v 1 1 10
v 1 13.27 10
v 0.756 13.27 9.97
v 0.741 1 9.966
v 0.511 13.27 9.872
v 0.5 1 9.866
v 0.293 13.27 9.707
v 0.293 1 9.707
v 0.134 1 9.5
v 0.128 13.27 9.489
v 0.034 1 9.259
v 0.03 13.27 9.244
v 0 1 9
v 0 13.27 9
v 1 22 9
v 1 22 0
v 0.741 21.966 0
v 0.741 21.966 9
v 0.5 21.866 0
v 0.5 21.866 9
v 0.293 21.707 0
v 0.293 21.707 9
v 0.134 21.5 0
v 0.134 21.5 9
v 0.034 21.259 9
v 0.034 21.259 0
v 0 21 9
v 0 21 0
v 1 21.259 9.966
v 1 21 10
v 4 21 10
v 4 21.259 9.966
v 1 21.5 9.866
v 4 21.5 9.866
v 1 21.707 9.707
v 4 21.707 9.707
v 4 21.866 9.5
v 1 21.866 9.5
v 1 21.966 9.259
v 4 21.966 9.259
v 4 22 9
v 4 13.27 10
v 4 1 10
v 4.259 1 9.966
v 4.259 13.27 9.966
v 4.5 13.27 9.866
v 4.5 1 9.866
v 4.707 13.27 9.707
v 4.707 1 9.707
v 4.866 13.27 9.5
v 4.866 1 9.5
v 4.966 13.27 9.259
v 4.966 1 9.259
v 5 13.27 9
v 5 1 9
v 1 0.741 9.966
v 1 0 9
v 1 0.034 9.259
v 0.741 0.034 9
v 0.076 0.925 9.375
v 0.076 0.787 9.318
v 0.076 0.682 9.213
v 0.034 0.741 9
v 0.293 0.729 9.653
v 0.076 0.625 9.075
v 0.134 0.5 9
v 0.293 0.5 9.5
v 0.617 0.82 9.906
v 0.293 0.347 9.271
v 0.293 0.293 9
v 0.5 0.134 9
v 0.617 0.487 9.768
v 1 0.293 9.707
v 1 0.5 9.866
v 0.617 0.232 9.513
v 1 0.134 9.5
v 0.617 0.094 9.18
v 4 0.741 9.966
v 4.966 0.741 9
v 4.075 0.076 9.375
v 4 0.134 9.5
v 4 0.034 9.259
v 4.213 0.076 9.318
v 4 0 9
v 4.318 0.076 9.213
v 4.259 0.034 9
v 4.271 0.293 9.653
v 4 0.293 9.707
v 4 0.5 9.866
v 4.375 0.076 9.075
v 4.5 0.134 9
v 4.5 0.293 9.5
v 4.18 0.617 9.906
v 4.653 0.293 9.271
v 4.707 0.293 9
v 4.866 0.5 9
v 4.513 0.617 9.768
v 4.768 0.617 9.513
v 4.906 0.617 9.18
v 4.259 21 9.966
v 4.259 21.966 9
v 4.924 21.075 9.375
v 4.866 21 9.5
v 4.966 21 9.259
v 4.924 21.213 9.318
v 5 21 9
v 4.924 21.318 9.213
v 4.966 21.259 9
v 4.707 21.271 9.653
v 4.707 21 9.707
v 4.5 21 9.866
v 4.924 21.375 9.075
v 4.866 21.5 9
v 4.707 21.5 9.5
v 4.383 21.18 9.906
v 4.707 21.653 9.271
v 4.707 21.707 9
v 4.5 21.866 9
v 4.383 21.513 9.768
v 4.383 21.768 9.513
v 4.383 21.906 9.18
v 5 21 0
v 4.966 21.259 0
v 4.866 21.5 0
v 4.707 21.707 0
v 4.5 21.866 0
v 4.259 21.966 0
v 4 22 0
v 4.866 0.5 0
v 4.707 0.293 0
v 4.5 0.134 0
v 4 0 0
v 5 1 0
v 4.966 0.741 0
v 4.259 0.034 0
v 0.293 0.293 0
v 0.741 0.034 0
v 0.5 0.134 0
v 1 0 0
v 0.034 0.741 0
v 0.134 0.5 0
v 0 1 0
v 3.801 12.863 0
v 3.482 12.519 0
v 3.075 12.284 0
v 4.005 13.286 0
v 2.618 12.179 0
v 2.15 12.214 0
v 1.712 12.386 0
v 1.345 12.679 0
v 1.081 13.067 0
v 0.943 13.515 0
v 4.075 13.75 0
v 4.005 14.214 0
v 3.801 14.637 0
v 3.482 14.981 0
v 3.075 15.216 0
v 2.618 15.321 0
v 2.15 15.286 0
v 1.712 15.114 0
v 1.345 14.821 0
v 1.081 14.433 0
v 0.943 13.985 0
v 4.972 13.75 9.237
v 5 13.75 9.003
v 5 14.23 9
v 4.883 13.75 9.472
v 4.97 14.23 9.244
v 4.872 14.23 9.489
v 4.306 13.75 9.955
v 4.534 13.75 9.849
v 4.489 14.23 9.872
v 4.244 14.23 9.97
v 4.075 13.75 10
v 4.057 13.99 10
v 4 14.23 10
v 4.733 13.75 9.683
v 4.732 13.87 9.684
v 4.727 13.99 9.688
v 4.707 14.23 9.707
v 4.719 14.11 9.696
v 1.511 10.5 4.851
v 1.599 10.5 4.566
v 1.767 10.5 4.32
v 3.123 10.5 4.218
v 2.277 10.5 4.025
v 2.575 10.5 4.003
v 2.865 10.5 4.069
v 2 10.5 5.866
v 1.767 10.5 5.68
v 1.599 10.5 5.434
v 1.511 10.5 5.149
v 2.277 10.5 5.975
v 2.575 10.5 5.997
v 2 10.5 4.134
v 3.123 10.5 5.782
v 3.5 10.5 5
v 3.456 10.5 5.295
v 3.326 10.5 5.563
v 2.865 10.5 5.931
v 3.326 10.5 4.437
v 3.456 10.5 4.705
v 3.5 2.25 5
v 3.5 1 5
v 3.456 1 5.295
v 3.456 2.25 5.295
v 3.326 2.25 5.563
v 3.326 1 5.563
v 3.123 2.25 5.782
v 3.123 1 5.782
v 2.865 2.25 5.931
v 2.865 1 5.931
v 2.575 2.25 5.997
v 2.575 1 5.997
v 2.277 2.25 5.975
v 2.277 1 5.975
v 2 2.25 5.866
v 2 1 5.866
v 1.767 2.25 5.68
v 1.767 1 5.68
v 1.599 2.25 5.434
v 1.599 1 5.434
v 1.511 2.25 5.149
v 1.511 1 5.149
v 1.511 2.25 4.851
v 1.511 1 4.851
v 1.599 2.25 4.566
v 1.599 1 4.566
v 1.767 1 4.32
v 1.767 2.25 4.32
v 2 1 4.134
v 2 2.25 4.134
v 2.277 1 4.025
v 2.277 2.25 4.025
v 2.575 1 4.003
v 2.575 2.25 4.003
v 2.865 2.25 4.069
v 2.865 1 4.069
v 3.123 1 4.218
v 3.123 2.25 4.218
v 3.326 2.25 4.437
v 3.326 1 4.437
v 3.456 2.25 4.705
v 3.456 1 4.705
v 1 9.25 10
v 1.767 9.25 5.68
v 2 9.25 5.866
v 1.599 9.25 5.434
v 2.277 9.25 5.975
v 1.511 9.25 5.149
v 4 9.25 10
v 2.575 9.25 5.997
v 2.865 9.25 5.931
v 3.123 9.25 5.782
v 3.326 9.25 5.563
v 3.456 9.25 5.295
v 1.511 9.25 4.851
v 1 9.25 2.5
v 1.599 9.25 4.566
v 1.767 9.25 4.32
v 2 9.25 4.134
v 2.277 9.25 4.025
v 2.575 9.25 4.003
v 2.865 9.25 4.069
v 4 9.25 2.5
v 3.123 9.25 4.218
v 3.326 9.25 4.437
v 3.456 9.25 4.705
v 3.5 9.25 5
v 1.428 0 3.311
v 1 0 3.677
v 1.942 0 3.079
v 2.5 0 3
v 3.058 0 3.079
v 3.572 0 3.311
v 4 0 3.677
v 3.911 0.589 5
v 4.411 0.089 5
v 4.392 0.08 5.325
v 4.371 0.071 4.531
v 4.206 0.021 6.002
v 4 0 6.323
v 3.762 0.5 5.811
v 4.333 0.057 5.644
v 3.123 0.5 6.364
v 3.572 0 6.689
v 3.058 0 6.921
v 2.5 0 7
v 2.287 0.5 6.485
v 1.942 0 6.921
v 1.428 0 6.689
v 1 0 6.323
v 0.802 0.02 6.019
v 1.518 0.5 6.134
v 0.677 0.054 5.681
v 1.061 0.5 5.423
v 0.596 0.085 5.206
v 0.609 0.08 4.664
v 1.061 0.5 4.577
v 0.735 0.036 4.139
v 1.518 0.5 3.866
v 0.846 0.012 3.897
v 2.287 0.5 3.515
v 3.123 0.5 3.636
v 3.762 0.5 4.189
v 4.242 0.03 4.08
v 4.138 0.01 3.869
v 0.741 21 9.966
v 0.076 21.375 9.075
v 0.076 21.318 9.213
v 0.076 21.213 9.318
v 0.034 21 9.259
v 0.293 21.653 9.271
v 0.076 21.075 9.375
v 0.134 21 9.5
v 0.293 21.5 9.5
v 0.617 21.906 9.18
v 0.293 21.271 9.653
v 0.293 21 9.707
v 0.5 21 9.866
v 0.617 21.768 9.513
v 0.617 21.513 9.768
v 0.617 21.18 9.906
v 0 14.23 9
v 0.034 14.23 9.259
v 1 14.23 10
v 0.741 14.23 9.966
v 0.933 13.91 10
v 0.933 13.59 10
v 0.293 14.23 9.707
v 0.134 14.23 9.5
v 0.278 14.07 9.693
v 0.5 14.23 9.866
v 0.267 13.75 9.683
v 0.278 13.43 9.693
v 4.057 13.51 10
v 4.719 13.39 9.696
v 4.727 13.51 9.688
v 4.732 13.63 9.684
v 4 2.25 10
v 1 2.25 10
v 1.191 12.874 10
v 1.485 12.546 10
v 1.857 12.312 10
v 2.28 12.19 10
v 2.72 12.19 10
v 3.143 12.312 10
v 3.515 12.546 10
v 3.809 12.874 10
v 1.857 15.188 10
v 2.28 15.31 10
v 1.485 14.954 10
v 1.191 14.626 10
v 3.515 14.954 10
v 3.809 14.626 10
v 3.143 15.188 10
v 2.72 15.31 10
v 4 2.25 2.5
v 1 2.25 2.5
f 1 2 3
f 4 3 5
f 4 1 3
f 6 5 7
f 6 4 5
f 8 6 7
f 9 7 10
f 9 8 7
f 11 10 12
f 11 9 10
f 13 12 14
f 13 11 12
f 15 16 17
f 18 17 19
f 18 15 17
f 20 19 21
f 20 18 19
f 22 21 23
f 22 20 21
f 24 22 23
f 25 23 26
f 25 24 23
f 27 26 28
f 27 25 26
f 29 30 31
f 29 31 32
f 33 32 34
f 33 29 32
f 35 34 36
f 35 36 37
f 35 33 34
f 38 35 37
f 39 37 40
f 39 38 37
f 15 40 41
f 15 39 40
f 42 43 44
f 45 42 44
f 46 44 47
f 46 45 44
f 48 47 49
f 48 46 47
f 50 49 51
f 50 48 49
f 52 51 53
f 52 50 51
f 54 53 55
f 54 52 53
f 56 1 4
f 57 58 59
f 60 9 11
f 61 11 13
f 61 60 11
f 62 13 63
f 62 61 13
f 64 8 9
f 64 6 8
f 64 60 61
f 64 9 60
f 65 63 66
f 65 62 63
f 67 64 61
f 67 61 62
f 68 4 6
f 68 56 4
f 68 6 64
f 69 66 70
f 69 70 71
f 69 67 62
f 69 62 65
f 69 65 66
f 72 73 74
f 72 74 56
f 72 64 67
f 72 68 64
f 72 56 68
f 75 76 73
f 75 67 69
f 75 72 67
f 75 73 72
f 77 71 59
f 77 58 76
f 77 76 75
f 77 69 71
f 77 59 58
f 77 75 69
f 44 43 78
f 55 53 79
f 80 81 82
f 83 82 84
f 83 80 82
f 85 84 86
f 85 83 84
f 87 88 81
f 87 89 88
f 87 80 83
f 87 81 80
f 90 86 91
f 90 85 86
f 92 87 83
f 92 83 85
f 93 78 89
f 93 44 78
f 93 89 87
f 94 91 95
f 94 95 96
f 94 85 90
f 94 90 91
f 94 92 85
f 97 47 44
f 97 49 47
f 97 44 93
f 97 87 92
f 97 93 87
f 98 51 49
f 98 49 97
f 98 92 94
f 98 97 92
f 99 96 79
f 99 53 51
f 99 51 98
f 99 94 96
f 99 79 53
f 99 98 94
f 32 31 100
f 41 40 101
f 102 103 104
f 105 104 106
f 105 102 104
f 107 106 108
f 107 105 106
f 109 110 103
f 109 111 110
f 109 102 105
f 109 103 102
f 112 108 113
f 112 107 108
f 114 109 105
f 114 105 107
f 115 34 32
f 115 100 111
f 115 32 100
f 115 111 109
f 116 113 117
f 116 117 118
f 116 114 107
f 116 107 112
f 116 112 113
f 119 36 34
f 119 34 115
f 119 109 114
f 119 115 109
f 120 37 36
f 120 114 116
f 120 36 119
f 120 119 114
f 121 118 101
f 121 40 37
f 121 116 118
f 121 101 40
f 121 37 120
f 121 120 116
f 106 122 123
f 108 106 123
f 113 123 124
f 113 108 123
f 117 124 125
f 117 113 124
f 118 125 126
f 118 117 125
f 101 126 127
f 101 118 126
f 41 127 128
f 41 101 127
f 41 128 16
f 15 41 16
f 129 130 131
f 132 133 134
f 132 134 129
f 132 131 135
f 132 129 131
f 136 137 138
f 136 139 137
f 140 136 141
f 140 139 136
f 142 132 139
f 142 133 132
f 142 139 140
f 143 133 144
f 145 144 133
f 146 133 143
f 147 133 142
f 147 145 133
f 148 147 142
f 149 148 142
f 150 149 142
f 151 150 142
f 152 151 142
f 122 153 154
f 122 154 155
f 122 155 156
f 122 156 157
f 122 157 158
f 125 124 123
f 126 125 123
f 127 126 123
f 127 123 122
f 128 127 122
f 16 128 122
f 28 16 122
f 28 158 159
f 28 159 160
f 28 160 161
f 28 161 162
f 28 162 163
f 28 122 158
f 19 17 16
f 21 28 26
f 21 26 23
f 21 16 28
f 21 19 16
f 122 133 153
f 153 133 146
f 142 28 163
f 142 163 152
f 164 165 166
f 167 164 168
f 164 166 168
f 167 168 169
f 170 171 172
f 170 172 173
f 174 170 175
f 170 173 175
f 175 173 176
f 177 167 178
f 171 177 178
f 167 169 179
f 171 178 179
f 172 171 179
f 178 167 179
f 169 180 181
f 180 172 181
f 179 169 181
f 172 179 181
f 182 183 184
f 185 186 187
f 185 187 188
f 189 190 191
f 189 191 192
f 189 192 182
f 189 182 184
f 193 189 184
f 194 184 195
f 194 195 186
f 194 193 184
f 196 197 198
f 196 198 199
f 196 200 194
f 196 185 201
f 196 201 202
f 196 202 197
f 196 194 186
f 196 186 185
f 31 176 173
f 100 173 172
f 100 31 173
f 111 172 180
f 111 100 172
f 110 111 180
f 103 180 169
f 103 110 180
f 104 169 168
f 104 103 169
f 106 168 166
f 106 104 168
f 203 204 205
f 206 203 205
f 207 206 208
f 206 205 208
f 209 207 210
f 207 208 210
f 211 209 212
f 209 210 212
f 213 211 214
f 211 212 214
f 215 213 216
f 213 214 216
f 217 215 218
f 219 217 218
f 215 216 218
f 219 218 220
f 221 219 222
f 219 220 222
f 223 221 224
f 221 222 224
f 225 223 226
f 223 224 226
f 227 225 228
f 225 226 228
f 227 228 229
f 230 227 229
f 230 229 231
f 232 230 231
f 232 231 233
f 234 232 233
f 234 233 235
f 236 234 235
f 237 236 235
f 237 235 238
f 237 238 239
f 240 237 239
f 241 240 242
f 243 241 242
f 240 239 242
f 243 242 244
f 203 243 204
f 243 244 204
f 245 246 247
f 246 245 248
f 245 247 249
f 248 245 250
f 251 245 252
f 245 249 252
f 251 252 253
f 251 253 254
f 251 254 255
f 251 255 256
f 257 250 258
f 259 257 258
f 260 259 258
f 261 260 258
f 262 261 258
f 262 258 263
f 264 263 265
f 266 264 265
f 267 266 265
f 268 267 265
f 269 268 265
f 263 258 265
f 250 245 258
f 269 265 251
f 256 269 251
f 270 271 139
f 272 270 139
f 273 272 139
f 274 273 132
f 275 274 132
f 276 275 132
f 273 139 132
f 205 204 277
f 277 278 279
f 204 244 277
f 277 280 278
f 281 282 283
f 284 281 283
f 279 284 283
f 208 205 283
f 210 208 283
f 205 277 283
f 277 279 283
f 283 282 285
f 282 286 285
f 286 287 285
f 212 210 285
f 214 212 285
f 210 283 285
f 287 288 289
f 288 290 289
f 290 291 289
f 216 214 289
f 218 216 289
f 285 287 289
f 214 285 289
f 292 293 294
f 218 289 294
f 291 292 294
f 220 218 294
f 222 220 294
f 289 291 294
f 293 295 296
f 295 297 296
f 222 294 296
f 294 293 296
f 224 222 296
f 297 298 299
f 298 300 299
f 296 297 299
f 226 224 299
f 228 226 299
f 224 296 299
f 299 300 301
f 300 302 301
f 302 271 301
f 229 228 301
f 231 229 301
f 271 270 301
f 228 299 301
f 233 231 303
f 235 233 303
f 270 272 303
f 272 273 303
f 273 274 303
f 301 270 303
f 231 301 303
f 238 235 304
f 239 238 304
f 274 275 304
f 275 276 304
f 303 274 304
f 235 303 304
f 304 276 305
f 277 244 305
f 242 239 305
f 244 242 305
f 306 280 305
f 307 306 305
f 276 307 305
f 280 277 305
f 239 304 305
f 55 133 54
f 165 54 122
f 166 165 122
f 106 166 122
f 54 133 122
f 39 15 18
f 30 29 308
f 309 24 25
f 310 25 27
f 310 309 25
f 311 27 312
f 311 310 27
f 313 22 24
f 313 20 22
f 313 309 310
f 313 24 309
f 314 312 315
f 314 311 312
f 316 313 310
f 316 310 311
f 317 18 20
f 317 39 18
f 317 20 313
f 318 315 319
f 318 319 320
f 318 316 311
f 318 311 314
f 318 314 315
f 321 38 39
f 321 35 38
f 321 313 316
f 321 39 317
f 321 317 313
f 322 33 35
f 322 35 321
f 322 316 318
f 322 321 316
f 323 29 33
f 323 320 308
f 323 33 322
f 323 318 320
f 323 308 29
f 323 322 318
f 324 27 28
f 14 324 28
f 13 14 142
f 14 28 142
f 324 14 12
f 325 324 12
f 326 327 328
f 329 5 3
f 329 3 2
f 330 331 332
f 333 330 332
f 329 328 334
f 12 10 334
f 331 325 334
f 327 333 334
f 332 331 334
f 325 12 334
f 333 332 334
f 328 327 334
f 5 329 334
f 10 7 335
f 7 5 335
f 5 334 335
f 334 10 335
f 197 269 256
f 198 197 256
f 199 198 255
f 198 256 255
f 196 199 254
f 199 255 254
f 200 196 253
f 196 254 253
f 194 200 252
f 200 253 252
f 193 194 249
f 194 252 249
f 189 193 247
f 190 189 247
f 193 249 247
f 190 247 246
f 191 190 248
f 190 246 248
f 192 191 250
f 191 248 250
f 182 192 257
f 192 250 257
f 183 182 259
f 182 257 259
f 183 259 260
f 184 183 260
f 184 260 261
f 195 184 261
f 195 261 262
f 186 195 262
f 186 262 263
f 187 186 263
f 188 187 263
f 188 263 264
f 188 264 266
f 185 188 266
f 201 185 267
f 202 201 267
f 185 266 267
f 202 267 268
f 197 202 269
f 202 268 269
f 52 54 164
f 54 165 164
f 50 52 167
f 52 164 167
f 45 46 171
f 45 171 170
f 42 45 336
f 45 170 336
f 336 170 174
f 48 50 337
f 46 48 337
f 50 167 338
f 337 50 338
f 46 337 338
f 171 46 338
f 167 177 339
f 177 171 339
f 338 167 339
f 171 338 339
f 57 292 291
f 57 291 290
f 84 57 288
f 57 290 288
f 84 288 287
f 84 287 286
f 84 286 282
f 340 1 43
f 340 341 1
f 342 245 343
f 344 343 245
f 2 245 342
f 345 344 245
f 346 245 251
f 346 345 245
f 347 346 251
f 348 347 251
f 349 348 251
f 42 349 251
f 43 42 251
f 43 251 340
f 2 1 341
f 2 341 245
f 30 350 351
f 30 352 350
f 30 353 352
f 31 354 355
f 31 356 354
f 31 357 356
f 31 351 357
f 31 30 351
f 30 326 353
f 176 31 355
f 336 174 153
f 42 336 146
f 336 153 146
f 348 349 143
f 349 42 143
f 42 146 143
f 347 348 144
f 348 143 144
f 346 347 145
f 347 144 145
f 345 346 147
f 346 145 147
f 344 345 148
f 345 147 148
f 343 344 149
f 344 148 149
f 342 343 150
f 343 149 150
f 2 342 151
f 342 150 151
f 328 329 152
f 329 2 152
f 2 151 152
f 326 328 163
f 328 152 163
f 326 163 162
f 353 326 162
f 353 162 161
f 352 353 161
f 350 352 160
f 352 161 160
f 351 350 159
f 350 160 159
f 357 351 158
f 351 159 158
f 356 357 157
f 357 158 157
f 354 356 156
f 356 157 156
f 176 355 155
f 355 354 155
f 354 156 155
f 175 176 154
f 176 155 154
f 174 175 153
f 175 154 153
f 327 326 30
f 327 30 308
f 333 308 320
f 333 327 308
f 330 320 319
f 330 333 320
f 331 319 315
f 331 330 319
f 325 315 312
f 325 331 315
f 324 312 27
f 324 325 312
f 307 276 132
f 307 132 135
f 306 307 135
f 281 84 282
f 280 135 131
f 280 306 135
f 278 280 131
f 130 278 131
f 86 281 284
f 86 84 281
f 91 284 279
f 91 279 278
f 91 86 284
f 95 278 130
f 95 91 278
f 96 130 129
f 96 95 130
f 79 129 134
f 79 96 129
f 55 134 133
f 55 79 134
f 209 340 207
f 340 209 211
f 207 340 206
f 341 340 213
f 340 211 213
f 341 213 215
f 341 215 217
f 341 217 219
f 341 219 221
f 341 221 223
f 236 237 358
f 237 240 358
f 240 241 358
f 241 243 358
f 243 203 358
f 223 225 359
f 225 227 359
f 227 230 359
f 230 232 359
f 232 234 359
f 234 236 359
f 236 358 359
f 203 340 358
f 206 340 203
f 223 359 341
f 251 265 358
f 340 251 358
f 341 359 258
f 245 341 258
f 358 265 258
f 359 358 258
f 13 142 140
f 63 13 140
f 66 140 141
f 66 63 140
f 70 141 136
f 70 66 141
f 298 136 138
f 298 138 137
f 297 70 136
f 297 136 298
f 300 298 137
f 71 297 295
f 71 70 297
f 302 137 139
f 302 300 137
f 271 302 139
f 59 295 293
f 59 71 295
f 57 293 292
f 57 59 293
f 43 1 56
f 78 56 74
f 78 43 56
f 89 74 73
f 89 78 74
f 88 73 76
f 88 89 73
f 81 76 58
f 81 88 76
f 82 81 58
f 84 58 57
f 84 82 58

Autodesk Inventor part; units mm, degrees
ref_plane "YZ Plane" through (0, 0, 0) normal (1, 0, 0) x (0, 1, 0)
ref_plane "XZ Plane" through (0, 0, 0) normal (0, 1, 0) x (-1, 0, 0)
ref_plane "XY Plane" through (0, 0, 0) normal (0, 0, 1) x (1, 0, 0)
sketch "Sketch1" plane through (0, 0, 0) normal (0, 0, 1) x (1, 0, 0)
  line L0 (0, 0) -> (5, 0)
  line L1 (5, 0) -> (5, 22)
  line L2 (5, 22) -> (0, 22)
  line L3 (0, 22) -> (0, 0)
  line L4 (2.5, 0) -> (2.5, 22) construction
  circle A0 centre (2.5, 13.75) radius 1.575
  line L5 (4, 2.25) -> (1, 2.25)
  line L6 (1, 2.25) -> (1, 9.25)
  line L7 (1, 9.25) -> (4, 9.25)
  line L8 (4, 9.25) -> (4, 2.25)
  dimension "d0" = 5
  dimension "d1" = 22
  dimension "d2" = 3.15
  dimension "d3" = 13.75
  dimension "d7" = 7
  dimension "d8" = 2.25
  dimension "d9" = 1
  dimension "d10" = 1
extrude "Extrusion1" add sketch "Sketch1" along normal blind 10
fillet "Fillet1" radius 1 8 edges at (2.5, 22, 10) (5, 11, 10) (2.5, 0, 10) (5, 22, 5) (0, 22, 5) (5, 0, 5) (0, 0, 5) (0, 11, 10)
sketch "Sketch2" plane through (0, 0, 0) normal (0, 0, -1) x (-1, 0, 0)
  line L0 (-1, 0) -> (-4, 0) projected
  line L1 (0, 21) -> (0, 1) projected
  line L2 (-4, 22) -> (-1, 22) projected
  line L3 (-5, 1) -> (-5, 21) projected
  line L4 (-1, 9.25) -> (-1, 2.25) projected
  line L5 (-1, 2.25) -> (-4, 2.25) projected
  line L6 (-4, 2.25) -> (-4, 9.25) projected
  line L7 (-4, 9.25) -> (-1, 9.25) projected
  circle A0 centre (-2.5, 13.75) radius 1.575 projected
  arc A1 (-5, 1) -> (-4, 0) centre (-4, 1) ccw projected
  arc A2 (-1, 0) -> (0, 1) centre (-1, 1) ccw projected
  arc A3 (0, 21) -> (-1, 22) centre (-1, 21) ccw projected
  arc A4 (-4, 22) -> (-5, 21) centre (-4, 21) ccw projected
  point P0 (0, 0)
extrude "Extrusion2" add sketch "Sketch2" against normal blind 2.5 contours L4 L5 L6 L7
sketch "Sketch4" plane through (0, 0, 0) normal (0, -1, 0) x (1, 0, 0)
  line L0 (1, 0) -> (4, 0) projected
  line L1 (1, 10) -> (4, 10) construction
  line L2 (2.5, 10) -> (2.5, 0) construction
  line L3 (4.075, 0) -> (0.925, 0) construction
  circle A0 centre (2.5, 5) radius 1
  line L4 (4, 9) -> (4, 0) projected
  line L5 (1, 9) -> (4, 9) projected
  line L6 (1, 0) -> (1, 9) projected
  point P0 (0, 0)
  dimension "d13" = 2
  dimension "d14" = 5
extrude "Extrusion3" cut sketch "Sketch4" against normal blind 10.5 contours A0
chamfer "Chamfer1" distance 1 angle 45 1 edges at (1.5, 0, 5)
equation "\"d10\" = d9"
properties part number "hotend__belt_holder" material "ABS Plastic"
